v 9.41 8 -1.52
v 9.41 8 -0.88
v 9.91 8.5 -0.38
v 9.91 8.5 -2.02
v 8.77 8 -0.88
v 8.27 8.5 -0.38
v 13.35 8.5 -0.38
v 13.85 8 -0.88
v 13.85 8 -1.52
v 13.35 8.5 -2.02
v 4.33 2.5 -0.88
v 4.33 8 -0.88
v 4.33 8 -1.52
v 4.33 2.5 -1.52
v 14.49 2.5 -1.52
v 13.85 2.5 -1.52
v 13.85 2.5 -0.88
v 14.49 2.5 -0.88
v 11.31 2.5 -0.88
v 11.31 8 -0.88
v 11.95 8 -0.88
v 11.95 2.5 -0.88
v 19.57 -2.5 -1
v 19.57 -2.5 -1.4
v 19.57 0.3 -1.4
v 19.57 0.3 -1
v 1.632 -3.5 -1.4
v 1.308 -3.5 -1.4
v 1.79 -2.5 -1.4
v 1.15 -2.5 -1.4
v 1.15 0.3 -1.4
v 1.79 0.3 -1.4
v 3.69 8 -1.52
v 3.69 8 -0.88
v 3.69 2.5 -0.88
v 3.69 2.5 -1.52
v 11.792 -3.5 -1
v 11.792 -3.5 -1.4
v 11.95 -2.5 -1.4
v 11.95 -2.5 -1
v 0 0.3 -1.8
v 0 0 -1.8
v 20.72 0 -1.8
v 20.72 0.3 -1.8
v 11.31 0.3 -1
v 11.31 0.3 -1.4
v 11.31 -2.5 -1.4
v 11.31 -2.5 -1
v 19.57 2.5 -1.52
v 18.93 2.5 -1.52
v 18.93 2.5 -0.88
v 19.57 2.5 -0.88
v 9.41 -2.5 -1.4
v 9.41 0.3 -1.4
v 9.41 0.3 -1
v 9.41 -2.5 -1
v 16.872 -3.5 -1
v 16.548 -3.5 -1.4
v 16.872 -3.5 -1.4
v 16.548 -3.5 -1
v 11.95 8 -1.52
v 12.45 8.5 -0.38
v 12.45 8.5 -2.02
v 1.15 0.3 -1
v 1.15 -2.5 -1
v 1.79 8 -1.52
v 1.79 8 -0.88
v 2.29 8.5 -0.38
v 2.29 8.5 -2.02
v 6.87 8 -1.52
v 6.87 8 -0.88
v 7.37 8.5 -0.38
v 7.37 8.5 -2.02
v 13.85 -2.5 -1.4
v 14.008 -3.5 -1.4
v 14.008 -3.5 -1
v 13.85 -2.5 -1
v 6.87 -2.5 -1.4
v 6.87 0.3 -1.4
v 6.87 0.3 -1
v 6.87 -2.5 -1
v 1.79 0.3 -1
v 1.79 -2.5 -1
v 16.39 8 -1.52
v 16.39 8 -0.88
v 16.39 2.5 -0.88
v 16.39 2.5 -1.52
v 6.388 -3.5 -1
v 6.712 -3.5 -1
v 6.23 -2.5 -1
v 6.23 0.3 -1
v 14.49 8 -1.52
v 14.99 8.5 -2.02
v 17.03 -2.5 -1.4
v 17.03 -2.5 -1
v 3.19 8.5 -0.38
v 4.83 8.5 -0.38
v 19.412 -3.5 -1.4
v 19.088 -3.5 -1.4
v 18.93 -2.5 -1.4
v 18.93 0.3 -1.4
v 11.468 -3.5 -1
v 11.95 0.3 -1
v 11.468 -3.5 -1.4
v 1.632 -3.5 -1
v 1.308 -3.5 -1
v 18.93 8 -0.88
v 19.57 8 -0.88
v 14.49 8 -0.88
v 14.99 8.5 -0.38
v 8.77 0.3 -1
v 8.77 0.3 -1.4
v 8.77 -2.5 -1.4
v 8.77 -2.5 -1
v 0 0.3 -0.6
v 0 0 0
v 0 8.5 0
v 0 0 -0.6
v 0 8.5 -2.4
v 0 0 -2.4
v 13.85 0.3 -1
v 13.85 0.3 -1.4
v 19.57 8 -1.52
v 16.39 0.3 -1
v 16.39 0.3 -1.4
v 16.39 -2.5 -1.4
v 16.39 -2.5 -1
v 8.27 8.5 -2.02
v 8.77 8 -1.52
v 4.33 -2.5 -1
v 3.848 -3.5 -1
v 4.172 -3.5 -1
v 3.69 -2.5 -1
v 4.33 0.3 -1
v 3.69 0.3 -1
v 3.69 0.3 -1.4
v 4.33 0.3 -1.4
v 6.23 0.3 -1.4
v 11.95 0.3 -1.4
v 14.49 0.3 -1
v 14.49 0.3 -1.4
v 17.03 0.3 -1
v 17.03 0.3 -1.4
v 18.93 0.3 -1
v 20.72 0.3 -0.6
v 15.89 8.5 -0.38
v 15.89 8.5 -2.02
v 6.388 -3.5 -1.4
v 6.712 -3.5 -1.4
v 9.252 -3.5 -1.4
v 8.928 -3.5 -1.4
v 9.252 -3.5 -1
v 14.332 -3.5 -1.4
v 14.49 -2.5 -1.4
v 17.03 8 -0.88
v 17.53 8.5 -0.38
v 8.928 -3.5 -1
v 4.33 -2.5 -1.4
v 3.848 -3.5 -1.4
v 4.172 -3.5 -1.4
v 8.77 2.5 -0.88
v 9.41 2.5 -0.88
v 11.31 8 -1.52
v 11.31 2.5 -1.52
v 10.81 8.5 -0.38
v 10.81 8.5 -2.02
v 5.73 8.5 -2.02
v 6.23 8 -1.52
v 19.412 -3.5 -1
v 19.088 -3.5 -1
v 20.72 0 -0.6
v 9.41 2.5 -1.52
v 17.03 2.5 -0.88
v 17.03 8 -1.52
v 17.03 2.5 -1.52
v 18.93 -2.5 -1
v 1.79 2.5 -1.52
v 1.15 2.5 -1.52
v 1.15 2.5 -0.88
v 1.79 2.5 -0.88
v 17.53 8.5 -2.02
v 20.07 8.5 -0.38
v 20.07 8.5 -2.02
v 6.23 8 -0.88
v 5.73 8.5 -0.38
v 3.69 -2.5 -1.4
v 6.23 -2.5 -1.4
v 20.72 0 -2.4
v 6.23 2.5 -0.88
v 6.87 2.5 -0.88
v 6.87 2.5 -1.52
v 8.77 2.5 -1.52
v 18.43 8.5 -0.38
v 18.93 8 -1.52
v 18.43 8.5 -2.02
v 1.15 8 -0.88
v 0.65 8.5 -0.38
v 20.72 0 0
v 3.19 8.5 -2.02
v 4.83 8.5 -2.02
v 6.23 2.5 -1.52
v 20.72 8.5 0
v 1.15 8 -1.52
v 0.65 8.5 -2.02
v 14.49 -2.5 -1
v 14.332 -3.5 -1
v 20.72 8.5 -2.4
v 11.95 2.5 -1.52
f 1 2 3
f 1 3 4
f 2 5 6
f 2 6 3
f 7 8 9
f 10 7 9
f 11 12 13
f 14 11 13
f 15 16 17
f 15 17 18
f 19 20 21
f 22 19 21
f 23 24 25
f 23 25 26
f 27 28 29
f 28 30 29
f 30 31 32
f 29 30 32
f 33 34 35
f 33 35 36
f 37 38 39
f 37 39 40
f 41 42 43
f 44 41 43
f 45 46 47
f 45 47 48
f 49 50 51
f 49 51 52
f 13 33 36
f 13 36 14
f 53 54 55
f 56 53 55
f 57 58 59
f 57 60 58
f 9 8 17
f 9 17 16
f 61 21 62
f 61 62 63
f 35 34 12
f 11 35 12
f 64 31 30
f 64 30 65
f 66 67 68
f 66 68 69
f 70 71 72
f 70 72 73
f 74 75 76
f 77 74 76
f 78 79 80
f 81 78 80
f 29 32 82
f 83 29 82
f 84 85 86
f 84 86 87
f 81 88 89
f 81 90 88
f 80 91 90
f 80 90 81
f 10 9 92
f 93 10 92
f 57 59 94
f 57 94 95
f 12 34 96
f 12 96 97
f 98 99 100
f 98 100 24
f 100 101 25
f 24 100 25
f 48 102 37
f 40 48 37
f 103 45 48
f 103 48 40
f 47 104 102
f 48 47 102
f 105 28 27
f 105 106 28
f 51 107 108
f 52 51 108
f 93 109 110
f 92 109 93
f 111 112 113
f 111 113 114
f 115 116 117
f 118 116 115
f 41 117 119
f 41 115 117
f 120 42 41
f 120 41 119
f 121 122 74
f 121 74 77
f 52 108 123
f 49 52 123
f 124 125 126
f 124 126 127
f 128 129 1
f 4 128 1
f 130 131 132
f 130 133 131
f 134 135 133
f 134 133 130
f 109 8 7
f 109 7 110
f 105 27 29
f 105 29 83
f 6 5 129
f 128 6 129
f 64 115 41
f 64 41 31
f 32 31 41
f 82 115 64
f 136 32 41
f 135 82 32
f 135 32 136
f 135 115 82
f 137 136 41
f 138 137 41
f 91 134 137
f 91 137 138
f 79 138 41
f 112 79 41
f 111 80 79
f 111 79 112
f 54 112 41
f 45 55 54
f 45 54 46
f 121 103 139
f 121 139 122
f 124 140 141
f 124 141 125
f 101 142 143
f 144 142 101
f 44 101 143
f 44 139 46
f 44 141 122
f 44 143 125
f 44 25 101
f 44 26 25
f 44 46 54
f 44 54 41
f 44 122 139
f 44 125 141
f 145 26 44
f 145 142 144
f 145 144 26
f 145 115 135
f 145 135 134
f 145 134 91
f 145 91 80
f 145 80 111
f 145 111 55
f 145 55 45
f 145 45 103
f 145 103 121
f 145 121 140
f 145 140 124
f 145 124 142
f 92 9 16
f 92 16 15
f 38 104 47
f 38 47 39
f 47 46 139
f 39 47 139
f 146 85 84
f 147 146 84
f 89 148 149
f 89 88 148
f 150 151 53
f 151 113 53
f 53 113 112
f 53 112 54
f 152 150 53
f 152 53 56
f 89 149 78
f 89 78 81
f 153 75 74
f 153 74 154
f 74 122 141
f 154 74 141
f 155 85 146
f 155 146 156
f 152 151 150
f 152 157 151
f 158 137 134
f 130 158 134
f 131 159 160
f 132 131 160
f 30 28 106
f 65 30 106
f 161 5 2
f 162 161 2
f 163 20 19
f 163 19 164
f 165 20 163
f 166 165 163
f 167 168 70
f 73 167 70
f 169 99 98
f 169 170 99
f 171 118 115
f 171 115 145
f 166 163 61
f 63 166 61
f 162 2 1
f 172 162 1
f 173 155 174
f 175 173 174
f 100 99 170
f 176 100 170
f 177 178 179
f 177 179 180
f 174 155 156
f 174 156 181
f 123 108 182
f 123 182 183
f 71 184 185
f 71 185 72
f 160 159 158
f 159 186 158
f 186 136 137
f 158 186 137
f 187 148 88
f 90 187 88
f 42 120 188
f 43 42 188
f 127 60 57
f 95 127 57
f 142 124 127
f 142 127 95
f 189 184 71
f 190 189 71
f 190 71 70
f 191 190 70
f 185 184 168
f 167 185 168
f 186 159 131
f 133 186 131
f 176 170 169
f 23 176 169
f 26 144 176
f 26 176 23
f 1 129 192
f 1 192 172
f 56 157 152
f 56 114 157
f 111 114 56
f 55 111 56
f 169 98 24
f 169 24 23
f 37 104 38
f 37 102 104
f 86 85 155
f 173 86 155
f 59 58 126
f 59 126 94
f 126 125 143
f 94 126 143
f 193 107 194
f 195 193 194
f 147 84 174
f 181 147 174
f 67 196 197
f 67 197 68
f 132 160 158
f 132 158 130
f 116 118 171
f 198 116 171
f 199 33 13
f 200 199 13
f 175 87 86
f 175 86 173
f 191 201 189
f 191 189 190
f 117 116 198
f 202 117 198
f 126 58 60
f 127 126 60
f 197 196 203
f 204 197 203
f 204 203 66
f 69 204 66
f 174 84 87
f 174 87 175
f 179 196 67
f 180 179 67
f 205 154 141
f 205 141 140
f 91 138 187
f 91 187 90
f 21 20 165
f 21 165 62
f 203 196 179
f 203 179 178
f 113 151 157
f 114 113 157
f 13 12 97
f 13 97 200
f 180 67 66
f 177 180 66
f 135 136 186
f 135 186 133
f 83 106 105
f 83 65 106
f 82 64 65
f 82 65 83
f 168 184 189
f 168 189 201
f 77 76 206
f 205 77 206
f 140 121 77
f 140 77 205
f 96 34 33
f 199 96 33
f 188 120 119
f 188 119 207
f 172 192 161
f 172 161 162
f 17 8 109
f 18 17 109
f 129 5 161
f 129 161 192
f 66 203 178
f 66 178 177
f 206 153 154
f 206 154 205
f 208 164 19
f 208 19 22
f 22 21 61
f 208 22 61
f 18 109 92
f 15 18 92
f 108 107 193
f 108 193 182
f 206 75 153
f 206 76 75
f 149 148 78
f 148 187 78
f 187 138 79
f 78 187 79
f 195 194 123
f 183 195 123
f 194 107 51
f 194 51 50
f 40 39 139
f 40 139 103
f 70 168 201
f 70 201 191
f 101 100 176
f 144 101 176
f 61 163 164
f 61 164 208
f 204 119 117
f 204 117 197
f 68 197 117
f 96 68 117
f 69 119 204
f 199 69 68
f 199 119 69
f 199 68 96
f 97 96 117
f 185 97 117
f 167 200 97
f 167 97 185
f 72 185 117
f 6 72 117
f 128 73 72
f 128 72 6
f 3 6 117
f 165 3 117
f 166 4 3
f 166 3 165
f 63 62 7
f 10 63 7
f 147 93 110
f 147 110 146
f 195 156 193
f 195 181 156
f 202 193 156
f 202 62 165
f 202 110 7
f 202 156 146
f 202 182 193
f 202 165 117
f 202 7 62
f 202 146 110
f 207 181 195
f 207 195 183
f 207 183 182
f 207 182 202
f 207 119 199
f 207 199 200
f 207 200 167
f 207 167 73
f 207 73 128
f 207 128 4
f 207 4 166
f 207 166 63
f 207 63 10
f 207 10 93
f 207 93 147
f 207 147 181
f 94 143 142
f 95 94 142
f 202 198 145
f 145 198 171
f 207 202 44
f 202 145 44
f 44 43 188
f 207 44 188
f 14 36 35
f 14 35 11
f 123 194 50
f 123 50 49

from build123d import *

# Parameters (mm, degrees)
SKETCH1_W              = 20.72
SKETCH1_H              = 2.4
BOSS_EXTRUDE1_DEPTH    = 8.5
SKETCH3_W              = 20.72
SKETCH3_H              = 1.2
CUT_EXTRUDE1_DEPTH     = 0.3
SKETCH4_W              = 0.64
SKETCH4_H              = 0.64
CUT_EXTRUDE2_DEPTH     = 6
CHAMFER2_SIZE          = 0.5
SKETCH5_W              = 0.64
SKETCH5_H              = 0.4
BOSS_EXTRUDE2_DEPTH    = 3.8
CHAMFER3_SIZE          = 1
CHAMFER3_SIZE2         = 0.15838444
CHAMFER3_PART_2_SIZE   = 1
CHAMFER3_PART_2_SIZE2  = 0.15838444
CHAMFER3_PART_3_SIZE   = 1
CHAMFER3_PART_3_SIZE2  = 0.15838444
CHAMFER3_PART_4_SIZE   = 1
CHAMFER3_PART_4_SIZE2  = 0.15838444
CHAMFER3_PART_5_SIZE   = 1
CHAMFER3_PART_5_SIZE2  = 0.15838444
CHAMFER3_PART_6_SIZE   = 1
CHAMFER3_PART_6_SIZE2  = 0.15838444
CHAMFER3_PART_7_SIZE   = 1
CHAMFER3_PART_7_SIZE2  = 0.15838444
CHAMFER3_PART_8_SIZE   = 1
CHAMFER3_PART_8_SIZE2  = 0.15838444
CHAMFER3_PART_9_SIZE   = 1
CHAMFER3_PART_9_SIZE2  = 0.15838444
CHAMFER3_PART_10_SIZE  = 1
CHAMFER3_PART_10_SIZE2 = 0.15838444
CHAMFER3_PART_11_SIZE  = 1
CHAMFER3_PART_11_SIZE2 = 0.15838444
CHAMFER3_PART_12_SIZE  = 1
CHAMFER3_PART_12_SIZE2 = 0.15838444
CHAMFER3_PART_13_SIZE  = 1
CHAMFER3_PART_13_SIZE2 = 0.15838444
CHAMFER3_PART_14_SIZE  = 1
CHAMFER3_PART_14_SIZE2 = 0.15838444
CHAMFER3_PART_15_SIZE  = 1
CHAMFER3_PART_15_SIZE2 = 0.15838444
CHAMFER3_PART_16_SIZE  = 1
CHAMFER3_PART_16_SIZE2 = 0.15838444


with BuildPart() as part:
    # Sketch1 → Boss-Extrude1 (new body)
    with BuildSketch(Plane(origin=(0, 0, 0), x_dir=(1, 0, 0), z_dir=(0, 1, 0))):
        with Locations((10.36, 1.2)):
            Rectangle(SKETCH1_W, SKETCH1_H)
    extrude(amount=BOSS_EXTRUDE1_DEPTH)

    # Sketch3 → Cut-Extrude1 (cut)
    with BuildSketch(Plane.XZ):
        with Locations((10.36, -1.2)):
            Rectangle(SKETCH3_W, SKETCH3_H)
    extrude(amount=-CUT_EXTRUDE1_DEPTH, mode=Mode.SUBTRACT)

    # Sketch4 → Cut-Extrude2 (cut)
    with BuildSketch(Plane(origin=(0, 8.5, 0), x_dir=(1, 0, 0), z_dir=(0, 1, 0))):
        with Locations((4.01, 1.2)):
            Rectangle(SKETCH4_W, SKETCH4_H)
        with Locations((1.47, 1.2)):
            Rectangle(SKETCH4_W, SKETCH4_H)
        with Locations((6.55, 1.2)):
            Rectangle(SKETCH4_W, SKETCH4_H)
        with Locations((9.09, 1.2)):
            Rectangle(SKETCH4_W, SKETCH4_H)
        with Locations((11.63, 1.2)):
            Rectangle(SKETCH4_W, SKETCH4_H)
        with Locations((14.17, 1.2)):
            Rectangle(SKETCH4_W, SKETCH4_H)
        with Locations((16.71, 1.2)):
            Rectangle(SKETCH4_W, SKETCH4_H)
        with Locations((19.25, 1.2)):
            Rectangle(SKETCH4_W, SKETCH4_H)
    extrude(amount=-CUT_EXTRUDE2_DEPTH, mode=Mode.SUBTRACT)

    # Chamfer2
    chamfer2_edges = [part.edges().sort_by_distance(p)[0] for p in [
        (1.79, 8.5, -1.2),
        (1.47, 8.5, -1.52),
        (1.15, 8.5, -1.2),
        (1.47, 8.5, -0.88),
        (4.01, 8.5, -1.52),
        (3.69, 8.5, -1.2),
        (4.01, 8.5, -0.88),
        (4.33, 8.5, -1.2),
        (6.55, 8.5, -1.52),
        (6.23, 8.5, -1.2),
        (6.55, 8.5, -0.88),
        (6.87, 8.5, -1.2),
        (9.09, 8.5, -1.52),
        (8.77, 8.5, -1.2),
        (9.09, 8.5, -0.88),
        (9.41, 8.5, -1.2),
        (11.63, 8.5, -1.52),
        (11.31, 8.5, -1.2),
        (11.63, 8.5, -0.88),
        (11.95, 8.5, -1.2),
        (14.17, 8.5, -1.52),
        (13.85, 8.5, -1.2),
        (14.17, 8.5, -0.88),
        (14.49, 8.5, -1.2),
        (16.71, 8.5, -1.52),
        (16.39, 8.5, -1.2),
        (16.71, 8.5, -0.88),
        (17.03, 8.5, -1.2),
        (19.25, 8.5, -1.52),
        (18.93, 8.5, -1.2),
        (19.25, 8.5, -0.88),
        (19.57, 8.5, -1.2),
    ]]
    chamfer(chamfer2_edges, length=CHAMFER2_SIZE)

    # Sketch5 → Boss-Extrude2 (add)
    with BuildSketch(Plane.XZ.offset(-0.3)):
        with Locations((4.01, -1.2)):
            Rectangle(SKETCH5_W, SKETCH5_H)
        with Locations((1.47, -1.2)):
            Rectangle(SKETCH5_W, SKETCH5_H)
        with Locations((6.55, -1.2)):
            Rectangle(SKETCH5_W, SKETCH5_H)
        with Locations((9.09, -1.2)):
            Rectangle(SKETCH5_W, SKETCH5_H)
        with Locations((11.63, -1.2)):
            Rectangle(SKETCH5_W, SKETCH5_H)
        with Locations((14.17, -1.2)):
            Rectangle(SKETCH5_W, SKETCH5_H)
        with Locations((16.71, -1.2)):
            Rectangle(SKETCH5_W, SKETCH5_H)
        with Locations((19.25, -1.2)):
            Rectangle(SKETCH5_W, SKETCH5_H)
    extrude(amount=BOSS_EXTRUDE2_DEPTH)

    # Chamfer3
    chamfer3_edges = [part.edges().sort_by_distance(p)[0] for p in [
        (1.79, -3.5, -1.2),
    ]]
    chamfer3_side = [part.faces().sort_by_distance(p)[0] for p in [
        (1.79, -1.6, -1.2),
    ]]
    chamfer(chamfer3_edges, length=CHAMFER3_SIZE, length2=CHAMFER3_SIZE2, reference=chamfer3_side[0])

    # Chamfer3 part 2
    chamfer3_part_2_edges = [part.edges().sort_by_distance(p)[0] for p in [
        (1.15, -3.5, -1.2),
    ]]
    chamfer3_part_2_side = [part.faces().sort_by_distance(p)[0] for p in [
        (1.15, -1.6, -1.2),
    ]]
    chamfer(chamfer3_part_2_edges, length=CHAMFER3_PART_2_SIZE, length2=CHAMFER3_PART_2_SIZE2, reference=chamfer3_part_2_side[0])

    # Chamfer3 part 3
    chamfer3_part_3_edges = [part.edges().sort_by_distance(p)[0] for p in [
        (3.69, -3.5, -1.2),
    ]]
    chamfer3_part_3_side = [part.faces().sort_by_distance(p)[0] for p in [
        (3.69, -1.6, -1.2),
    ]]
    chamfer(chamfer3_part_3_edges, length=CHAMFER3_PART_3_SIZE, length2=CHAMFER3_PART_3_SIZE2, reference=chamfer3_part_3_side[0])

    # Chamfer3 part 4
    chamfer3_part_4_edges = [part.edges().sort_by_distance(p)[0] for p in [
        (4.33, -3.5, -1.2),
    ]]
    chamfer3_part_4_side = [part.faces().sort_by_distance(p)[0] for p in [
        (4.33, -1.6, -1.2),
    ]]
    chamfer(chamfer3_part_4_edges, length=CHAMFER3_PART_4_SIZE, length2=CHAMFER3_PART_4_SIZE2, reference=chamfer3_part_4_side[0])

    # Chamfer3 part 5
    chamfer3_part_5_edges = [part.edges().sort_by_distance(p)[0] for p in [
        (6.23, -3.5, -1.2),
    ]]
    chamfer3_part_5_side = [part.faces().sort_by_distance(p)[0] for p in [
        (6.23, -1.6, -1.2),
    ]]
    chamfer(chamfer3_part_5_edges, length=CHAMFER3_PART_5_SIZE, length2=CHAMFER3_PART_5_SIZE2, reference=chamfer3_part_5_side[0])

    # Chamfer3 part 6
    chamfer3_part_6_edges = [part.edges().sort_by_distance(p)[0] for p in [
        (6.87, -3.5, -1.2),
    ]]
    chamfer3_part_6_side = [part.faces().sort_by_distance(p)[0] for p in [
        (6.87, -1.6, -1.2),
    ]]
    chamfer(chamfer3_part_6_edges, length=CHAMFER3_PART_6_SIZE, length2=CHAMFER3_PART_6_SIZE2, reference=chamfer3_part_6_side[0])

    # Chamfer3 part 7
    chamfer3_part_7_edges = [part.edges().sort_by_distance(p)[0] for p in [
        (8.77, -3.5, -1.2),
    ]]
    chamfer3_part_7_side = [part.faces().sort_by_distance(p)[0] for p in [
        (8.77, -1.6, -1.2),
    ]]
    chamfer(chamfer3_part_7_edges, length=CHAMFER3_PART_7_SIZE, length2=CHAMFER3_PART_7_SIZE2, reference=chamfer3_part_7_side[0])

    # Chamfer3 part 8
    chamfer3_part_8_edges = [part.edges().sort_by_distance(p)[0] for p in [
        (9.41, -3.5, -1.2),
    ]]
    chamfer3_part_8_side = [part.faces().sort_by_distance(p)[0] for p in [
        (9.41, -1.6, -1.2),
    ]]
    chamfer(chamfer3_part_8_edges, length=CHAMFER3_PART_8_SIZE, length2=CHAMFER3_PART_8_SIZE2, reference=chamfer3_part_8_side[0])

    # Chamfer3 part 9
    chamfer3_part_9_edges = [part.edges().sort_by_distance(p)[0] for p in [
        (11.31, -3.5, -1.2),
    ]]
    chamfer3_part_9_side = [part.faces().sort_by_distance(p)[0] for p in [
        (11.31, -1.6, -1.2),
    ]]
    chamfer(chamfer3_part_9_edges, length=CHAMFER3_PART_9_SIZE, length2=CHAMFER3_PART_9_SIZE2, reference=chamfer3_part_9_side[0])

    # Chamfer3 part 10
    chamfer3_part_10_edges = [part.edges().sort_by_distance(p)[0] for p in [
        (11.95, -3.5, -1.2),
    ]]
    chamfer3_part_10_side = [part.faces().sort_by_distance(p)[0] for p in [
        (11.95, -1.6, -1.2),
    ]]
    chamfer(chamfer3_part_10_edges, length=CHAMFER3_PART_10_SIZE, length2=CHAMFER3_PART_10_SIZE2, reference=chamfer3_part_10_side[0])

    # Chamfer3 part 11
    chamfer3_part_11_edges = [part.edges().sort_by_distance(p)[0] for p in [
        (13.85, -3.5, -1.2),
    ]]
    chamfer3_part_11_side = [part.faces().sort_by_distance(p)[0] for p in [
        (13.85, -1.6, -1.2),
    ]]
    chamfer(chamfer3_part_11_edges, length=CHAMFER3_PART_11_SIZE, length2=CHAMFER3_PART_11_SIZE2, reference=chamfer3_part_11_side[0])

    # Chamfer3 part 12
    chamfer3_part_12_edges = [part.edges().sort_by_distance(p)[0] for p in [
        (14.49, -3.5, -1.2),
    ]]
    chamfer3_part_12_side = [part.faces().sort_by_distance(p)[0] for p in [
        (14.49, -1.6, -1.2),
    ]]
    chamfer(chamfer3_part_12_edges, length=CHAMFER3_PART_12_SIZE, length2=CHAMFER3_PART_12_SIZE2, reference=chamfer3_part_12_side[0])

    # Chamfer3 part 13
    chamfer3_part_13_edges = [part.edges().sort_by_distance(p)[0] for p in [
        (16.39, -3.5, -1.2),
    ]]
    chamfer3_part_13_side = [part.faces().sort_by_distance(p)[0] for p in [
        (16.39, -1.6, -1.2),
    ]]
    chamfer(chamfer3_part_13_edges, length=CHAMFER3_PART_13_SIZE, length2=CHAMFER3_PART_13_SIZE2, reference=chamfer3_part_13_side[0])

    # Chamfer3 part 14
    chamfer3_part_14_edges = [part.edges().sort_by_distance(p)[0] for p in [
        (17.03, -3.5, -1.2),
    ]]
    chamfer3_part_14_side = [part.faces().sort_by_distance(p)[0] for p in [
        (17.03, -1.6, -1.2),
    ]]
    chamfer(chamfer3_part_14_edges, length=CHAMFER3_PART_14_SIZE, length2=CHAMFER3_PART_14_SIZE2, reference=chamfer3_part_14_side[0])

    # Chamfer3 part 15
    chamfer3_part_15_edges = [part.edges().sort_by_distance(p)[0] for p in [
        (18.93, -3.5, -1.2),
    ]]
    chamfer3_part_15_side = [part.faces().sort_by_distance(p)[0] for p in [
        (18.93, -1.6, -1.2),
    ]]
    chamfer(chamfer3_part_15_edges, length=CHAMFER3_PART_15_SIZE, length2=CHAMFER3_PART_15_SIZE2, reference=chamfer3_part_15_side[0])

    # Chamfer3 part 16
    chamfer3_part_16_edges = [part.edges().sort_by_distance(p)[0] for p in [
        (19.57, -3.5, -1.2),
    ]]
    chamfer3_part_16_side = [part.faces().sort_by_distance(p)[0] for p in [
        (19.57, -1.6, -1.2),
    ]]
    chamfer(chamfer3_part_16_edges, length=CHAMFER3_PART_16_SIZE, length2=CHAMFER3_PART_16_SIZE2, reference=chamfer3_part_16_side[0])


solid = part.part
